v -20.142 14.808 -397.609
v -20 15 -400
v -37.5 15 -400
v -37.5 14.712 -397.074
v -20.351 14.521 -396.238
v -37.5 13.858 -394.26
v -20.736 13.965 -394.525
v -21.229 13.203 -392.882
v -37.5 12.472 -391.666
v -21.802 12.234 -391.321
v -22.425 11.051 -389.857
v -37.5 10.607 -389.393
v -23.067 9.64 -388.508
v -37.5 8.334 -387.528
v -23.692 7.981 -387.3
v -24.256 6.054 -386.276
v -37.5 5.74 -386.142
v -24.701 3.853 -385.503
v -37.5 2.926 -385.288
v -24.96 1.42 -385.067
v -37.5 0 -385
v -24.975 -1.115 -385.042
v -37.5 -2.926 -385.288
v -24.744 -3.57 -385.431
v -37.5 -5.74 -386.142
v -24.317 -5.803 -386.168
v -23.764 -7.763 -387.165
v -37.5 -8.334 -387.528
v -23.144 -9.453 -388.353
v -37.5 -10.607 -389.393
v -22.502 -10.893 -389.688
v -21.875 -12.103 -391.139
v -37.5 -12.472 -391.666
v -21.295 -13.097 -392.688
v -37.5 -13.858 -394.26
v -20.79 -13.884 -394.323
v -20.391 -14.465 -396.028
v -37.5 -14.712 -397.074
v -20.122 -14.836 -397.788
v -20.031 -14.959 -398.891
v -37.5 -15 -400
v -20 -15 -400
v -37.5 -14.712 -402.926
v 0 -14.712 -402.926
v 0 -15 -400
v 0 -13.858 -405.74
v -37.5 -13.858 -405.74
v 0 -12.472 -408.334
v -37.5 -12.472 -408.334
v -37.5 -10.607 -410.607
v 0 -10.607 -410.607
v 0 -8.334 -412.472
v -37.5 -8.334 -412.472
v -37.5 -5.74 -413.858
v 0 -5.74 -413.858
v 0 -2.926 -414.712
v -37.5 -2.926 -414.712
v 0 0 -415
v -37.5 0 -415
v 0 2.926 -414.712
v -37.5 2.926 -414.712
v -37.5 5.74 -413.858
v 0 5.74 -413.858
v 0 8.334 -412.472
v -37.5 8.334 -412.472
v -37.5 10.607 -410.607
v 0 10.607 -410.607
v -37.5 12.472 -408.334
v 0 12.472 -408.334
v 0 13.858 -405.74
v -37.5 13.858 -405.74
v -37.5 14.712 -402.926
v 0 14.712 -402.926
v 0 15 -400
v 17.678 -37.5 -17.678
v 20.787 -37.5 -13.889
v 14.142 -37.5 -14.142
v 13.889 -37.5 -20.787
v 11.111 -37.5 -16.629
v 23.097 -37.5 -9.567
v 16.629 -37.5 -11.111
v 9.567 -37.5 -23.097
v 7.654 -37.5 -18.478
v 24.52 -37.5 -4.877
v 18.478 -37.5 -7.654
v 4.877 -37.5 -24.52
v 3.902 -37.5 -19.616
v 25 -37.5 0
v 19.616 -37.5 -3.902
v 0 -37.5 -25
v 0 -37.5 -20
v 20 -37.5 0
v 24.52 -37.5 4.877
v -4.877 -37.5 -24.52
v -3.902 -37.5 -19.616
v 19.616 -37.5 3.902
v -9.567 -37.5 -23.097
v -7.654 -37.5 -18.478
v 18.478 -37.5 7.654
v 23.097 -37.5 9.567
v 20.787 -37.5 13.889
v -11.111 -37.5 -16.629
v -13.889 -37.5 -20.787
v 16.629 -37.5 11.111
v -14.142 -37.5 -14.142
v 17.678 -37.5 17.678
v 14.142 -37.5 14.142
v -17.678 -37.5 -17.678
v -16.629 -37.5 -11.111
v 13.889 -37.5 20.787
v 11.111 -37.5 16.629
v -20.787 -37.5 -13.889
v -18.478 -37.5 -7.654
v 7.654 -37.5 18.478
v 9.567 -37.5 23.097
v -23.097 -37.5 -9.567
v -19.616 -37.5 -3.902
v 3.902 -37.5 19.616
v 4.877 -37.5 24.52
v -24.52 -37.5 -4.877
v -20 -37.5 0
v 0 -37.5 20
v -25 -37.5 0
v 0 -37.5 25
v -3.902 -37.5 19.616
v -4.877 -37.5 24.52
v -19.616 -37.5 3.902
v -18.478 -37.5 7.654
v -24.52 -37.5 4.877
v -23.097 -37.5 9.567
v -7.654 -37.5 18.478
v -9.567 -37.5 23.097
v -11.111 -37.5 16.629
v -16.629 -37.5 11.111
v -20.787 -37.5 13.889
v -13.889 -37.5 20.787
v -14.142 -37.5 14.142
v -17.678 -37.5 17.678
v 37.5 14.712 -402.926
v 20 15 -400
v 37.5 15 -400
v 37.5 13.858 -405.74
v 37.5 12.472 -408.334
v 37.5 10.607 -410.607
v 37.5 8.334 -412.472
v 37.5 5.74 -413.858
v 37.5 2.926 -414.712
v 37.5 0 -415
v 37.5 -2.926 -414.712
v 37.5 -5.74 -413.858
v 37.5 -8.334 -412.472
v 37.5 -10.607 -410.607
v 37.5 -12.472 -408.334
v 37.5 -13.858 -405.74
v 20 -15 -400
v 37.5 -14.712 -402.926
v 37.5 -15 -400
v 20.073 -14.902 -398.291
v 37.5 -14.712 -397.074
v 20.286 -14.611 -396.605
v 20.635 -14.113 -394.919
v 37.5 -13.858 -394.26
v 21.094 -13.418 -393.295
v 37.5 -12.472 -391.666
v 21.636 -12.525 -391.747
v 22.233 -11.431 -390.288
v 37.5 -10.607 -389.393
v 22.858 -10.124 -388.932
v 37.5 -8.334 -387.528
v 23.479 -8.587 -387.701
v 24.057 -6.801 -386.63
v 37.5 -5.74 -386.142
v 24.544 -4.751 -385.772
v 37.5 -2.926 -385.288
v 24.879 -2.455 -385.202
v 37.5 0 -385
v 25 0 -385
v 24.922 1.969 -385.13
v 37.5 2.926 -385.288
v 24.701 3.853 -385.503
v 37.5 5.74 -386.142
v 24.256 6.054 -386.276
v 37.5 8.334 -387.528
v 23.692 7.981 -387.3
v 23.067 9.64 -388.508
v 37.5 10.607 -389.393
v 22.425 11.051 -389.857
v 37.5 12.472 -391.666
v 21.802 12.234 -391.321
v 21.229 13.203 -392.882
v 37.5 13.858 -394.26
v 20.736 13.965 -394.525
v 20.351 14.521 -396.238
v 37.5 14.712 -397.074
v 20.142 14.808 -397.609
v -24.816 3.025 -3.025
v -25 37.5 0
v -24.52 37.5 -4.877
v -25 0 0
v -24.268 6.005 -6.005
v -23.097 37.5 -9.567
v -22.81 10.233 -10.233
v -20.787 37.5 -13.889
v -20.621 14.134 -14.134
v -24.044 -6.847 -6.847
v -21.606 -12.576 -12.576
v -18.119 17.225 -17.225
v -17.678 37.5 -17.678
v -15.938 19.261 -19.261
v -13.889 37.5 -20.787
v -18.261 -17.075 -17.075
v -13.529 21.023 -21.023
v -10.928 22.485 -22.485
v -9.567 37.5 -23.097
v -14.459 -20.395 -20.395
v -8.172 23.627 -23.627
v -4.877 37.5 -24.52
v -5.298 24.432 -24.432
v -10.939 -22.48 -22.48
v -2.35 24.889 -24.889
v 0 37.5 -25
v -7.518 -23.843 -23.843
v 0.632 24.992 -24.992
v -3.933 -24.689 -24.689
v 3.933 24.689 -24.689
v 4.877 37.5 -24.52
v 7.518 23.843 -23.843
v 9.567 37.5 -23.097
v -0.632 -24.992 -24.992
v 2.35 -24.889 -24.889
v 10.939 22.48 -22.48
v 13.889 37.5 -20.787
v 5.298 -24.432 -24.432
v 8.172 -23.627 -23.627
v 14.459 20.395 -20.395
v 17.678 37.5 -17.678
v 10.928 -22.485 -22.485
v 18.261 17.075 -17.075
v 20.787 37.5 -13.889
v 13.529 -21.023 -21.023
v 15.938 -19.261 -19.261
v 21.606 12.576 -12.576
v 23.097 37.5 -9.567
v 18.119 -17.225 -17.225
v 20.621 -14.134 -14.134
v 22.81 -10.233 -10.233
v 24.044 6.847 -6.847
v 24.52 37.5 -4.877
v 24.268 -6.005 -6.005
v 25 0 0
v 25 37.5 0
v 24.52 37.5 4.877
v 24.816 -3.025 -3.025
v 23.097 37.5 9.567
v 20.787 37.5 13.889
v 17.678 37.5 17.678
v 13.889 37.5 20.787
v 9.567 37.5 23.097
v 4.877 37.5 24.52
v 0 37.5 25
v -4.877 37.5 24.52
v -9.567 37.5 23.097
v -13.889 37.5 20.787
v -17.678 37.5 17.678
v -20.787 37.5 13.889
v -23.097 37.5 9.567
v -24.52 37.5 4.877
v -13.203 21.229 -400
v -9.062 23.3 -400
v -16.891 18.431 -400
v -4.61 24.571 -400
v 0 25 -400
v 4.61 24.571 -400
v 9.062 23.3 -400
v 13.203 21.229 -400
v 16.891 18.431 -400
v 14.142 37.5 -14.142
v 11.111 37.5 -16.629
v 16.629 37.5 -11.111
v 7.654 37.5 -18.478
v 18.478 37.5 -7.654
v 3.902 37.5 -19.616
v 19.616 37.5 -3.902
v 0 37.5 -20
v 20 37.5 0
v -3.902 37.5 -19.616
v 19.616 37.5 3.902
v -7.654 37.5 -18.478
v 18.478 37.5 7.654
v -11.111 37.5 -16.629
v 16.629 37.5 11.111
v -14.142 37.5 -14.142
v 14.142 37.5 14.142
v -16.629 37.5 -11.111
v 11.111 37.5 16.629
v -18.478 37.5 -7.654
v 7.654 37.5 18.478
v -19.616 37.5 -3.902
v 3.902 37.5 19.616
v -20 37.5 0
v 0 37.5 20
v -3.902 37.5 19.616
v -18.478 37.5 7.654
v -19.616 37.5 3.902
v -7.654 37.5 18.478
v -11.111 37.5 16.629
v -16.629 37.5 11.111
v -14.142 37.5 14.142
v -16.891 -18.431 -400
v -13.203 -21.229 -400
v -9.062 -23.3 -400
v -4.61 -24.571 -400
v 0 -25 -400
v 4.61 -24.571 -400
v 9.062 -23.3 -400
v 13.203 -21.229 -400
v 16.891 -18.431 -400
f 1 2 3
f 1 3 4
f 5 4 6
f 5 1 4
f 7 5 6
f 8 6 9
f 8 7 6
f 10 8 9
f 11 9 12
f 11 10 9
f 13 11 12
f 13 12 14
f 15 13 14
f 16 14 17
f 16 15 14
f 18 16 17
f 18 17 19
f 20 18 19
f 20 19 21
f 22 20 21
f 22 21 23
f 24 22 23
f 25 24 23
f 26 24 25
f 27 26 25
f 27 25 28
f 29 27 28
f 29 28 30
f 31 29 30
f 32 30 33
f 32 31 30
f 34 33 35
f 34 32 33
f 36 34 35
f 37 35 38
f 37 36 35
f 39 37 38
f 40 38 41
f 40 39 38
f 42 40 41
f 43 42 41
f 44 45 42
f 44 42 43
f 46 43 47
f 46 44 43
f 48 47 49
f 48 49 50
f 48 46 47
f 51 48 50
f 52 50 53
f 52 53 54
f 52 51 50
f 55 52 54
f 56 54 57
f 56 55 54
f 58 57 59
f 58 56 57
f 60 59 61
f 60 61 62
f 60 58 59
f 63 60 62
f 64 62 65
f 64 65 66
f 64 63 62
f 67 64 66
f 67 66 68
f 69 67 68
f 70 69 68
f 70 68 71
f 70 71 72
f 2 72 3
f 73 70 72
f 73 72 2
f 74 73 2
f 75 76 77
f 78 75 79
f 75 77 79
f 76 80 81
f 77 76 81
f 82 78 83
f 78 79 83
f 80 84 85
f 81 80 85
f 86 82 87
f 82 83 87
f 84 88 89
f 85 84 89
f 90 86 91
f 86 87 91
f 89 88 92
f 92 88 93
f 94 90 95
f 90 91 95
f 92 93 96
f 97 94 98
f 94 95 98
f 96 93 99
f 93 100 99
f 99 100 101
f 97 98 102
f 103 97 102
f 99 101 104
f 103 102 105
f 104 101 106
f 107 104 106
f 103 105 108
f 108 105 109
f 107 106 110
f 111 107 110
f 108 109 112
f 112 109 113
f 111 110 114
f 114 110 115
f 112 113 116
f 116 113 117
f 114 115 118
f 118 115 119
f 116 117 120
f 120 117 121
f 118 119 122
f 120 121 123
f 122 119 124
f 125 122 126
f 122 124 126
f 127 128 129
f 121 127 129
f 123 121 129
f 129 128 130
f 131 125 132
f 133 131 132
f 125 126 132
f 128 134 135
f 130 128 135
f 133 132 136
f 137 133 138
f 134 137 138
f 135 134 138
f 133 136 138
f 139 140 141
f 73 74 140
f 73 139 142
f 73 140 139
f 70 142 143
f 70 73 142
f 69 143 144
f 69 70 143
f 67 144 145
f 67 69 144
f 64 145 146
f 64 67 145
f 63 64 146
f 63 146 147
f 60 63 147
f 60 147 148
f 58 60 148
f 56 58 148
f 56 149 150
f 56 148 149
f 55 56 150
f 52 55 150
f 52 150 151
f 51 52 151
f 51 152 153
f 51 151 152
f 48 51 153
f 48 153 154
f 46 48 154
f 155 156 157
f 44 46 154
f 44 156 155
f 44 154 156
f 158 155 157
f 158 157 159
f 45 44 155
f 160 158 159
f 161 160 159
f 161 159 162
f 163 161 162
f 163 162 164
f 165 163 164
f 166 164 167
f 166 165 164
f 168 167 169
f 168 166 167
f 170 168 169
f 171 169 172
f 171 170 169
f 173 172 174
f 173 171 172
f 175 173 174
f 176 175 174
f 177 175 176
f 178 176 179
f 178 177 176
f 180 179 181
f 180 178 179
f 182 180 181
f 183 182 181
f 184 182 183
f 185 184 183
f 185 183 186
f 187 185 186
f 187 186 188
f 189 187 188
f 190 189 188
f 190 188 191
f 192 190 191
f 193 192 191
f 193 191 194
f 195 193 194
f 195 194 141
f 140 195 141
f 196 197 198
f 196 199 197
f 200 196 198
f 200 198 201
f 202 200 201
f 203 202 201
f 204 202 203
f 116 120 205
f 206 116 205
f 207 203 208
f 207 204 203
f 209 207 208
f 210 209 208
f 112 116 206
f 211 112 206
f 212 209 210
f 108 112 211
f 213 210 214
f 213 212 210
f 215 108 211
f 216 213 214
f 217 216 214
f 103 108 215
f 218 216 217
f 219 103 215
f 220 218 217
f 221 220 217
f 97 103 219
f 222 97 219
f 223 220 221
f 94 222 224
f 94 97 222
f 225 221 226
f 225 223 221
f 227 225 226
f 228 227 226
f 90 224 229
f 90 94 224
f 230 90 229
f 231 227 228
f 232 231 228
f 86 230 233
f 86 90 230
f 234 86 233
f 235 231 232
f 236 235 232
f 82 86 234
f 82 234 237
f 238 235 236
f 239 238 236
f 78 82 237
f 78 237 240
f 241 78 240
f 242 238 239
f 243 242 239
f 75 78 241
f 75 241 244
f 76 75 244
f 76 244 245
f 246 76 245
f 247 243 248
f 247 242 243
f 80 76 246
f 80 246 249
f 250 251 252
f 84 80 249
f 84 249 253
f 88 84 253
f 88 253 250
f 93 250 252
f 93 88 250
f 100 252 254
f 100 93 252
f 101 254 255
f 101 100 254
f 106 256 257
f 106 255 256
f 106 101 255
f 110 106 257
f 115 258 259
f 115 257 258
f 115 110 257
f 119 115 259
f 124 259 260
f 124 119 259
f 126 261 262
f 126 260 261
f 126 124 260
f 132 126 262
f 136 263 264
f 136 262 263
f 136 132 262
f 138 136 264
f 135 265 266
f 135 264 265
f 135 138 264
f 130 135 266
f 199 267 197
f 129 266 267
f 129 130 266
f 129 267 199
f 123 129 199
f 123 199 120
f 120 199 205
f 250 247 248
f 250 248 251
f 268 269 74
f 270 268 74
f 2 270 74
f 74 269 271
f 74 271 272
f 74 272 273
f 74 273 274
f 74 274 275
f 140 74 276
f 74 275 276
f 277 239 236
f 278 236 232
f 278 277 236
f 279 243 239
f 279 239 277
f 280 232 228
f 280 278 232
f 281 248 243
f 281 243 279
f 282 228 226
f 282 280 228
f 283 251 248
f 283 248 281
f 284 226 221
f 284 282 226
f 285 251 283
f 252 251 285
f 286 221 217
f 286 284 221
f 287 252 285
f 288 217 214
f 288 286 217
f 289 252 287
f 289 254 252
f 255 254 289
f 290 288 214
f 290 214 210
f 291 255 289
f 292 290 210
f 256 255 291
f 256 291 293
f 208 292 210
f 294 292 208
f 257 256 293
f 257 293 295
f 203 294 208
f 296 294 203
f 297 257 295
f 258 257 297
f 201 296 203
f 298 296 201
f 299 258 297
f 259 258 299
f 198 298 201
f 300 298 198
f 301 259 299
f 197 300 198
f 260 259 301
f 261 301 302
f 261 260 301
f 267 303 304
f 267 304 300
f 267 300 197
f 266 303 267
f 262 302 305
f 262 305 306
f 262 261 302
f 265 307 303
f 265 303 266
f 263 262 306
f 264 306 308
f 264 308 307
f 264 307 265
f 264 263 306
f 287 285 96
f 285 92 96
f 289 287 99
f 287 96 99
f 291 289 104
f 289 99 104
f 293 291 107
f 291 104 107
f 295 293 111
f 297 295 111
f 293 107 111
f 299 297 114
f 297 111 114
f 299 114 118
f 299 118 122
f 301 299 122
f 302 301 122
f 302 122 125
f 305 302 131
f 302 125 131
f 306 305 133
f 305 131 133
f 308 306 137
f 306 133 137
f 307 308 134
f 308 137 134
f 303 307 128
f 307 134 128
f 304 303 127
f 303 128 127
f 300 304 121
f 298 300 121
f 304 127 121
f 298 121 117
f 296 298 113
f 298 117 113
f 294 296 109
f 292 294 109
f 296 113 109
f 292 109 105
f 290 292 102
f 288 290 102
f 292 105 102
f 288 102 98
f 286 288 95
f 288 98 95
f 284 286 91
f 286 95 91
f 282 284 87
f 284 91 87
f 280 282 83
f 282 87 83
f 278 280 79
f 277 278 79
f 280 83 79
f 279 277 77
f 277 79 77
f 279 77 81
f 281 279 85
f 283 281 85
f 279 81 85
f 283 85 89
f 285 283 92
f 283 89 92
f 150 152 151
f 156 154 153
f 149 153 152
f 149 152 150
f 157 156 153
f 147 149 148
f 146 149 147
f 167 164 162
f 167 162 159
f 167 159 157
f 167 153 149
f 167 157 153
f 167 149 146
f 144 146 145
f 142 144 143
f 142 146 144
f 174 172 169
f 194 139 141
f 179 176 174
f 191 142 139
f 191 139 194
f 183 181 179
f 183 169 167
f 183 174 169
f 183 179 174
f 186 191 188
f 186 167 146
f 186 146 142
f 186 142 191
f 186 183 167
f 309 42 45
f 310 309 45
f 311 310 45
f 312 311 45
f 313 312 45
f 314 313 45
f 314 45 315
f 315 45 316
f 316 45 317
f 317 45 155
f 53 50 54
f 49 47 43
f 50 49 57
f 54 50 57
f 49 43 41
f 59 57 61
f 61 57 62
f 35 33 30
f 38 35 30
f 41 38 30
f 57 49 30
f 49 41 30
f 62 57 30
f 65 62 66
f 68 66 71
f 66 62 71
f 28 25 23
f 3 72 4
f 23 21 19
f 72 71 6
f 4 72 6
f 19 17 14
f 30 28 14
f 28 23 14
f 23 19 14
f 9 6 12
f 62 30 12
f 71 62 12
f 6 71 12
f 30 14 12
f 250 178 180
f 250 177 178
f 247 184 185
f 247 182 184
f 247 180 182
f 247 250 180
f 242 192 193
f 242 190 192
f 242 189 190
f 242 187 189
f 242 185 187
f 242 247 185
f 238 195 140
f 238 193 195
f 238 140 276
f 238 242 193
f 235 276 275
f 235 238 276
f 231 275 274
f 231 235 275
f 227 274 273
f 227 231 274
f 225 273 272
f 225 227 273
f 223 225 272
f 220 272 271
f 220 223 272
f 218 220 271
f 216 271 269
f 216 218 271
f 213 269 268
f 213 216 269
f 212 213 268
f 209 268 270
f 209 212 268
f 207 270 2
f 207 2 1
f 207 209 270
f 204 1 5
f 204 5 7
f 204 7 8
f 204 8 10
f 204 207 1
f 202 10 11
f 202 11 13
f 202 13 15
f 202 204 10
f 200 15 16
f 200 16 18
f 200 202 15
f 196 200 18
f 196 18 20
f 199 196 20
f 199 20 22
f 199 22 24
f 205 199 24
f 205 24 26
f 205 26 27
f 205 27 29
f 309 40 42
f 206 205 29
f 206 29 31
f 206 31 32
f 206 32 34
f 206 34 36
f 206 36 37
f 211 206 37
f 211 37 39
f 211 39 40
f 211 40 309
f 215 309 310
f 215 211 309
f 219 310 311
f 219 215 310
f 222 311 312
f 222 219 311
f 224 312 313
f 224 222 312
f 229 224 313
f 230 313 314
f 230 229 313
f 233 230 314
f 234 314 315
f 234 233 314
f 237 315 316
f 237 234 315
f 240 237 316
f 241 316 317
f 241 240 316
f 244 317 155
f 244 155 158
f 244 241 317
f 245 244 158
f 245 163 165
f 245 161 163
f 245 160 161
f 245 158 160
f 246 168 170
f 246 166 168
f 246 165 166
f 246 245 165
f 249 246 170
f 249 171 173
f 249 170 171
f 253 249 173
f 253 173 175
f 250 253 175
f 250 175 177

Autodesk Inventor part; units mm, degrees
ref_plane "作業平面1" through (0, 0, -400) normal (0, 0, 1) x (1, 0, 0)
sketch "スケッチ3" plane through (0, 0, 0) normal (0, 0, 1) x (1, 0, 0)
  circle A0 centre (0, 0) radius 25
  dimension "d7" = 50
extrude "押し出し2" add sketch "スケッチ3" against normal blind 400
sketch "スケッチ4" plane through (0, 0, 0) normal (0, 1, 0) x (-1, 0, 0)
  circle A0 centre (0, 0) radius 25
  dimension "d10" = 50
extrude "押し出し3" add sketch "スケッチ4" along normal mid plane 75
sketch "スケッチ5" plane through (0, -37.5, 0) normal (0, -1, 0) x (1, 0, 0)
  circle A0 centre (0, 0) radius 20
  dimension "d13" = 40
extrude "押し出し4" cut sketch "スケッチ5" against normal blind 75
sketch "スケッチ6" plane through (0, 0, 0) normal (1, 0, 0) x (0, 1, 0)
  circle A0 centre (0, -400) radius 15
  line L0 (-52.5, 0) -> (52.5, 0) projected
  point P0 (0, 0)
  dimension "d16" = 30
  dimension "d17" = 400
extrude "押し出し5" add sketch "スケッチ6" along normal mid plane 75
properties part number "LowerlegP"
